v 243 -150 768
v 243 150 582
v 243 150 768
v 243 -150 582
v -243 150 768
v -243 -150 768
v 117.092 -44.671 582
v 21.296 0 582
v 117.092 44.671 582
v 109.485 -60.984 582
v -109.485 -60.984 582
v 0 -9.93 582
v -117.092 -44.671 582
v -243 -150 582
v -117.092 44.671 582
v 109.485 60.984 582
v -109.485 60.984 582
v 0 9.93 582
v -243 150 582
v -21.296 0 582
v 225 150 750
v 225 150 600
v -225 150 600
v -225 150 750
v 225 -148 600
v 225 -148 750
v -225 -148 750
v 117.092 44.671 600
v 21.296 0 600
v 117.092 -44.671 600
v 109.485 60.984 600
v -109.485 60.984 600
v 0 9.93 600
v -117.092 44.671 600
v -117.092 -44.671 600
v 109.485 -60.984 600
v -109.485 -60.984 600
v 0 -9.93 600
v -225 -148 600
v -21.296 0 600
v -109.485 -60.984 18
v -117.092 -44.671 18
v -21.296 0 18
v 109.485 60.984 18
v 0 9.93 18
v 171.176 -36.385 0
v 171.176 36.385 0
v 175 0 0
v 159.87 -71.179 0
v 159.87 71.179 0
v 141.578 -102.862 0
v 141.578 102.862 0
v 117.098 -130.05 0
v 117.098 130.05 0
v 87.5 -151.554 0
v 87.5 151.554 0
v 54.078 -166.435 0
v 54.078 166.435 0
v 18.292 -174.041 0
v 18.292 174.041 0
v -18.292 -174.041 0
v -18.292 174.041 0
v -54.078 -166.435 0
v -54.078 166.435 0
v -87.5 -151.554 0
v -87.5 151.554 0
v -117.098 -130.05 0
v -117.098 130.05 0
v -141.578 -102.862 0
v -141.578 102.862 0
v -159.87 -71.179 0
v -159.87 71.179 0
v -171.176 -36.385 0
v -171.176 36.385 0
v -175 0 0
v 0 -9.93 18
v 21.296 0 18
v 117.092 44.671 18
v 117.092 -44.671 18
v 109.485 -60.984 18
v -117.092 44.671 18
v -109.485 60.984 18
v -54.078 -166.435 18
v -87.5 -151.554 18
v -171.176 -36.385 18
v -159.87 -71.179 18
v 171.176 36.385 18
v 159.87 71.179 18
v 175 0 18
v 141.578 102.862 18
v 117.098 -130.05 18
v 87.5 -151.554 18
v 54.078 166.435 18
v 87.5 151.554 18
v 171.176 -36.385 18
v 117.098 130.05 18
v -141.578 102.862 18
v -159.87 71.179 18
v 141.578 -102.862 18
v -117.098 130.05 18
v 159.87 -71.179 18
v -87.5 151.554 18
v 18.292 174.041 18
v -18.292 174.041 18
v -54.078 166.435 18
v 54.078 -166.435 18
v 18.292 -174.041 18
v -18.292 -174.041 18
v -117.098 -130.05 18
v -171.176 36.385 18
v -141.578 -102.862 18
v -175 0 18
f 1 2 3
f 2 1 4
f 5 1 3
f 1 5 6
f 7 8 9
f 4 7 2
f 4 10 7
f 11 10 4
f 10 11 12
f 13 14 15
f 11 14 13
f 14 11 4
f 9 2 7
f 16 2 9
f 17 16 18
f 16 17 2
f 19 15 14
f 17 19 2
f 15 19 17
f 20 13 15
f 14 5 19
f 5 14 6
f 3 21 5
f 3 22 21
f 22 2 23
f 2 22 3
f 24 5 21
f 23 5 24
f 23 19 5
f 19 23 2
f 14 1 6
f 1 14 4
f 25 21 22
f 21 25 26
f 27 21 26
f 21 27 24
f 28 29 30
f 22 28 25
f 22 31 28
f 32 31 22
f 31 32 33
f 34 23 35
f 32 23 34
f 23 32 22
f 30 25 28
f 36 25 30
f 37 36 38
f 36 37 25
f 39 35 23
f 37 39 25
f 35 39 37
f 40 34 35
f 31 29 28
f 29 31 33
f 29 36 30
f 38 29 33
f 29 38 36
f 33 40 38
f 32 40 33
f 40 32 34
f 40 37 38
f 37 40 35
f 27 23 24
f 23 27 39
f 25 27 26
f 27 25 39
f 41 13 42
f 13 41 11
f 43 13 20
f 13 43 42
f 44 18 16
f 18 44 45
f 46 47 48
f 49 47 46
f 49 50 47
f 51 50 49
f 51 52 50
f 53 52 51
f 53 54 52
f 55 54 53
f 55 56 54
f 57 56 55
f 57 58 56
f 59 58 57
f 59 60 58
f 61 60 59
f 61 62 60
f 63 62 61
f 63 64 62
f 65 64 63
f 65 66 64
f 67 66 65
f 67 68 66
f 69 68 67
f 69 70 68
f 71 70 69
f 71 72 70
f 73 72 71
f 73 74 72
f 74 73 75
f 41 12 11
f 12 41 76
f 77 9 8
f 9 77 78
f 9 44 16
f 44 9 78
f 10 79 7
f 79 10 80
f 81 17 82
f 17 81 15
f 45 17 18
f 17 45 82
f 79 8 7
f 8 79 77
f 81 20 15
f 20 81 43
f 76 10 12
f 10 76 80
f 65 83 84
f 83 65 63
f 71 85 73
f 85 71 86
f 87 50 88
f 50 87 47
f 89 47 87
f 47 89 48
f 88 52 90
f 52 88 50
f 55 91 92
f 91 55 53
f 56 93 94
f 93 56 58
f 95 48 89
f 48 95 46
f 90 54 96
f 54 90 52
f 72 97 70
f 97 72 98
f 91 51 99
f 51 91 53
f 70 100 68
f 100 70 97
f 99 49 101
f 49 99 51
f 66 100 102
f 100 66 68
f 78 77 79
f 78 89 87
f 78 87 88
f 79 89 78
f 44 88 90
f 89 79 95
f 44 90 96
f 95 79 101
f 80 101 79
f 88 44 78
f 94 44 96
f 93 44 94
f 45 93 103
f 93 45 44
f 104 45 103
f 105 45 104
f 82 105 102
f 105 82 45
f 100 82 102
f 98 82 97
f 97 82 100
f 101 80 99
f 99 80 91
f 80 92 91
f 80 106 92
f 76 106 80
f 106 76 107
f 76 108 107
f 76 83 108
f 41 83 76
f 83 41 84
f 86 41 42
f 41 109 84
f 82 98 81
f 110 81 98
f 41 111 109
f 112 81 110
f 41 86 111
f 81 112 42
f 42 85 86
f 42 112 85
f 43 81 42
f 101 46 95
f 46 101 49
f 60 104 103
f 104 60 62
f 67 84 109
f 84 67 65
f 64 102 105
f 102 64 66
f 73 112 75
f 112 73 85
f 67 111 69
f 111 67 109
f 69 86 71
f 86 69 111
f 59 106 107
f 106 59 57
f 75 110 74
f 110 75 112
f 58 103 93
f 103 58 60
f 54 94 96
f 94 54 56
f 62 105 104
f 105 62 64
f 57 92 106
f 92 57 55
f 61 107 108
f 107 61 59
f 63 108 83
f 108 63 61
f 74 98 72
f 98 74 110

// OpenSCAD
mat_t=18;


support_w=250;
support_h=600;

drawer_inside_h=150;
drawer_w=450;
drawer_d=300;

translate([0,0,support_h+drawer_inside_h/2]){
difference(){
    cube([drawer_w+2*mat_t, drawer_d, drawer_inside_h+2*mat_t], center=true);
    translate([0,2,0]){
    cube([drawer_w, drawer_d, drawer_inside_h], center=true);
    }
}
}

//Support
translate([0,0,support_h/2]){
rotate([0,0,+25]) cube([support_w, mat_t, support_h],center=true);
rotate([0,0,-25]) cube([support_w, mat_t, support_h],center=true);
}

//Floor stand
cylinder(h=mat_t, d=support_w*1.4);
